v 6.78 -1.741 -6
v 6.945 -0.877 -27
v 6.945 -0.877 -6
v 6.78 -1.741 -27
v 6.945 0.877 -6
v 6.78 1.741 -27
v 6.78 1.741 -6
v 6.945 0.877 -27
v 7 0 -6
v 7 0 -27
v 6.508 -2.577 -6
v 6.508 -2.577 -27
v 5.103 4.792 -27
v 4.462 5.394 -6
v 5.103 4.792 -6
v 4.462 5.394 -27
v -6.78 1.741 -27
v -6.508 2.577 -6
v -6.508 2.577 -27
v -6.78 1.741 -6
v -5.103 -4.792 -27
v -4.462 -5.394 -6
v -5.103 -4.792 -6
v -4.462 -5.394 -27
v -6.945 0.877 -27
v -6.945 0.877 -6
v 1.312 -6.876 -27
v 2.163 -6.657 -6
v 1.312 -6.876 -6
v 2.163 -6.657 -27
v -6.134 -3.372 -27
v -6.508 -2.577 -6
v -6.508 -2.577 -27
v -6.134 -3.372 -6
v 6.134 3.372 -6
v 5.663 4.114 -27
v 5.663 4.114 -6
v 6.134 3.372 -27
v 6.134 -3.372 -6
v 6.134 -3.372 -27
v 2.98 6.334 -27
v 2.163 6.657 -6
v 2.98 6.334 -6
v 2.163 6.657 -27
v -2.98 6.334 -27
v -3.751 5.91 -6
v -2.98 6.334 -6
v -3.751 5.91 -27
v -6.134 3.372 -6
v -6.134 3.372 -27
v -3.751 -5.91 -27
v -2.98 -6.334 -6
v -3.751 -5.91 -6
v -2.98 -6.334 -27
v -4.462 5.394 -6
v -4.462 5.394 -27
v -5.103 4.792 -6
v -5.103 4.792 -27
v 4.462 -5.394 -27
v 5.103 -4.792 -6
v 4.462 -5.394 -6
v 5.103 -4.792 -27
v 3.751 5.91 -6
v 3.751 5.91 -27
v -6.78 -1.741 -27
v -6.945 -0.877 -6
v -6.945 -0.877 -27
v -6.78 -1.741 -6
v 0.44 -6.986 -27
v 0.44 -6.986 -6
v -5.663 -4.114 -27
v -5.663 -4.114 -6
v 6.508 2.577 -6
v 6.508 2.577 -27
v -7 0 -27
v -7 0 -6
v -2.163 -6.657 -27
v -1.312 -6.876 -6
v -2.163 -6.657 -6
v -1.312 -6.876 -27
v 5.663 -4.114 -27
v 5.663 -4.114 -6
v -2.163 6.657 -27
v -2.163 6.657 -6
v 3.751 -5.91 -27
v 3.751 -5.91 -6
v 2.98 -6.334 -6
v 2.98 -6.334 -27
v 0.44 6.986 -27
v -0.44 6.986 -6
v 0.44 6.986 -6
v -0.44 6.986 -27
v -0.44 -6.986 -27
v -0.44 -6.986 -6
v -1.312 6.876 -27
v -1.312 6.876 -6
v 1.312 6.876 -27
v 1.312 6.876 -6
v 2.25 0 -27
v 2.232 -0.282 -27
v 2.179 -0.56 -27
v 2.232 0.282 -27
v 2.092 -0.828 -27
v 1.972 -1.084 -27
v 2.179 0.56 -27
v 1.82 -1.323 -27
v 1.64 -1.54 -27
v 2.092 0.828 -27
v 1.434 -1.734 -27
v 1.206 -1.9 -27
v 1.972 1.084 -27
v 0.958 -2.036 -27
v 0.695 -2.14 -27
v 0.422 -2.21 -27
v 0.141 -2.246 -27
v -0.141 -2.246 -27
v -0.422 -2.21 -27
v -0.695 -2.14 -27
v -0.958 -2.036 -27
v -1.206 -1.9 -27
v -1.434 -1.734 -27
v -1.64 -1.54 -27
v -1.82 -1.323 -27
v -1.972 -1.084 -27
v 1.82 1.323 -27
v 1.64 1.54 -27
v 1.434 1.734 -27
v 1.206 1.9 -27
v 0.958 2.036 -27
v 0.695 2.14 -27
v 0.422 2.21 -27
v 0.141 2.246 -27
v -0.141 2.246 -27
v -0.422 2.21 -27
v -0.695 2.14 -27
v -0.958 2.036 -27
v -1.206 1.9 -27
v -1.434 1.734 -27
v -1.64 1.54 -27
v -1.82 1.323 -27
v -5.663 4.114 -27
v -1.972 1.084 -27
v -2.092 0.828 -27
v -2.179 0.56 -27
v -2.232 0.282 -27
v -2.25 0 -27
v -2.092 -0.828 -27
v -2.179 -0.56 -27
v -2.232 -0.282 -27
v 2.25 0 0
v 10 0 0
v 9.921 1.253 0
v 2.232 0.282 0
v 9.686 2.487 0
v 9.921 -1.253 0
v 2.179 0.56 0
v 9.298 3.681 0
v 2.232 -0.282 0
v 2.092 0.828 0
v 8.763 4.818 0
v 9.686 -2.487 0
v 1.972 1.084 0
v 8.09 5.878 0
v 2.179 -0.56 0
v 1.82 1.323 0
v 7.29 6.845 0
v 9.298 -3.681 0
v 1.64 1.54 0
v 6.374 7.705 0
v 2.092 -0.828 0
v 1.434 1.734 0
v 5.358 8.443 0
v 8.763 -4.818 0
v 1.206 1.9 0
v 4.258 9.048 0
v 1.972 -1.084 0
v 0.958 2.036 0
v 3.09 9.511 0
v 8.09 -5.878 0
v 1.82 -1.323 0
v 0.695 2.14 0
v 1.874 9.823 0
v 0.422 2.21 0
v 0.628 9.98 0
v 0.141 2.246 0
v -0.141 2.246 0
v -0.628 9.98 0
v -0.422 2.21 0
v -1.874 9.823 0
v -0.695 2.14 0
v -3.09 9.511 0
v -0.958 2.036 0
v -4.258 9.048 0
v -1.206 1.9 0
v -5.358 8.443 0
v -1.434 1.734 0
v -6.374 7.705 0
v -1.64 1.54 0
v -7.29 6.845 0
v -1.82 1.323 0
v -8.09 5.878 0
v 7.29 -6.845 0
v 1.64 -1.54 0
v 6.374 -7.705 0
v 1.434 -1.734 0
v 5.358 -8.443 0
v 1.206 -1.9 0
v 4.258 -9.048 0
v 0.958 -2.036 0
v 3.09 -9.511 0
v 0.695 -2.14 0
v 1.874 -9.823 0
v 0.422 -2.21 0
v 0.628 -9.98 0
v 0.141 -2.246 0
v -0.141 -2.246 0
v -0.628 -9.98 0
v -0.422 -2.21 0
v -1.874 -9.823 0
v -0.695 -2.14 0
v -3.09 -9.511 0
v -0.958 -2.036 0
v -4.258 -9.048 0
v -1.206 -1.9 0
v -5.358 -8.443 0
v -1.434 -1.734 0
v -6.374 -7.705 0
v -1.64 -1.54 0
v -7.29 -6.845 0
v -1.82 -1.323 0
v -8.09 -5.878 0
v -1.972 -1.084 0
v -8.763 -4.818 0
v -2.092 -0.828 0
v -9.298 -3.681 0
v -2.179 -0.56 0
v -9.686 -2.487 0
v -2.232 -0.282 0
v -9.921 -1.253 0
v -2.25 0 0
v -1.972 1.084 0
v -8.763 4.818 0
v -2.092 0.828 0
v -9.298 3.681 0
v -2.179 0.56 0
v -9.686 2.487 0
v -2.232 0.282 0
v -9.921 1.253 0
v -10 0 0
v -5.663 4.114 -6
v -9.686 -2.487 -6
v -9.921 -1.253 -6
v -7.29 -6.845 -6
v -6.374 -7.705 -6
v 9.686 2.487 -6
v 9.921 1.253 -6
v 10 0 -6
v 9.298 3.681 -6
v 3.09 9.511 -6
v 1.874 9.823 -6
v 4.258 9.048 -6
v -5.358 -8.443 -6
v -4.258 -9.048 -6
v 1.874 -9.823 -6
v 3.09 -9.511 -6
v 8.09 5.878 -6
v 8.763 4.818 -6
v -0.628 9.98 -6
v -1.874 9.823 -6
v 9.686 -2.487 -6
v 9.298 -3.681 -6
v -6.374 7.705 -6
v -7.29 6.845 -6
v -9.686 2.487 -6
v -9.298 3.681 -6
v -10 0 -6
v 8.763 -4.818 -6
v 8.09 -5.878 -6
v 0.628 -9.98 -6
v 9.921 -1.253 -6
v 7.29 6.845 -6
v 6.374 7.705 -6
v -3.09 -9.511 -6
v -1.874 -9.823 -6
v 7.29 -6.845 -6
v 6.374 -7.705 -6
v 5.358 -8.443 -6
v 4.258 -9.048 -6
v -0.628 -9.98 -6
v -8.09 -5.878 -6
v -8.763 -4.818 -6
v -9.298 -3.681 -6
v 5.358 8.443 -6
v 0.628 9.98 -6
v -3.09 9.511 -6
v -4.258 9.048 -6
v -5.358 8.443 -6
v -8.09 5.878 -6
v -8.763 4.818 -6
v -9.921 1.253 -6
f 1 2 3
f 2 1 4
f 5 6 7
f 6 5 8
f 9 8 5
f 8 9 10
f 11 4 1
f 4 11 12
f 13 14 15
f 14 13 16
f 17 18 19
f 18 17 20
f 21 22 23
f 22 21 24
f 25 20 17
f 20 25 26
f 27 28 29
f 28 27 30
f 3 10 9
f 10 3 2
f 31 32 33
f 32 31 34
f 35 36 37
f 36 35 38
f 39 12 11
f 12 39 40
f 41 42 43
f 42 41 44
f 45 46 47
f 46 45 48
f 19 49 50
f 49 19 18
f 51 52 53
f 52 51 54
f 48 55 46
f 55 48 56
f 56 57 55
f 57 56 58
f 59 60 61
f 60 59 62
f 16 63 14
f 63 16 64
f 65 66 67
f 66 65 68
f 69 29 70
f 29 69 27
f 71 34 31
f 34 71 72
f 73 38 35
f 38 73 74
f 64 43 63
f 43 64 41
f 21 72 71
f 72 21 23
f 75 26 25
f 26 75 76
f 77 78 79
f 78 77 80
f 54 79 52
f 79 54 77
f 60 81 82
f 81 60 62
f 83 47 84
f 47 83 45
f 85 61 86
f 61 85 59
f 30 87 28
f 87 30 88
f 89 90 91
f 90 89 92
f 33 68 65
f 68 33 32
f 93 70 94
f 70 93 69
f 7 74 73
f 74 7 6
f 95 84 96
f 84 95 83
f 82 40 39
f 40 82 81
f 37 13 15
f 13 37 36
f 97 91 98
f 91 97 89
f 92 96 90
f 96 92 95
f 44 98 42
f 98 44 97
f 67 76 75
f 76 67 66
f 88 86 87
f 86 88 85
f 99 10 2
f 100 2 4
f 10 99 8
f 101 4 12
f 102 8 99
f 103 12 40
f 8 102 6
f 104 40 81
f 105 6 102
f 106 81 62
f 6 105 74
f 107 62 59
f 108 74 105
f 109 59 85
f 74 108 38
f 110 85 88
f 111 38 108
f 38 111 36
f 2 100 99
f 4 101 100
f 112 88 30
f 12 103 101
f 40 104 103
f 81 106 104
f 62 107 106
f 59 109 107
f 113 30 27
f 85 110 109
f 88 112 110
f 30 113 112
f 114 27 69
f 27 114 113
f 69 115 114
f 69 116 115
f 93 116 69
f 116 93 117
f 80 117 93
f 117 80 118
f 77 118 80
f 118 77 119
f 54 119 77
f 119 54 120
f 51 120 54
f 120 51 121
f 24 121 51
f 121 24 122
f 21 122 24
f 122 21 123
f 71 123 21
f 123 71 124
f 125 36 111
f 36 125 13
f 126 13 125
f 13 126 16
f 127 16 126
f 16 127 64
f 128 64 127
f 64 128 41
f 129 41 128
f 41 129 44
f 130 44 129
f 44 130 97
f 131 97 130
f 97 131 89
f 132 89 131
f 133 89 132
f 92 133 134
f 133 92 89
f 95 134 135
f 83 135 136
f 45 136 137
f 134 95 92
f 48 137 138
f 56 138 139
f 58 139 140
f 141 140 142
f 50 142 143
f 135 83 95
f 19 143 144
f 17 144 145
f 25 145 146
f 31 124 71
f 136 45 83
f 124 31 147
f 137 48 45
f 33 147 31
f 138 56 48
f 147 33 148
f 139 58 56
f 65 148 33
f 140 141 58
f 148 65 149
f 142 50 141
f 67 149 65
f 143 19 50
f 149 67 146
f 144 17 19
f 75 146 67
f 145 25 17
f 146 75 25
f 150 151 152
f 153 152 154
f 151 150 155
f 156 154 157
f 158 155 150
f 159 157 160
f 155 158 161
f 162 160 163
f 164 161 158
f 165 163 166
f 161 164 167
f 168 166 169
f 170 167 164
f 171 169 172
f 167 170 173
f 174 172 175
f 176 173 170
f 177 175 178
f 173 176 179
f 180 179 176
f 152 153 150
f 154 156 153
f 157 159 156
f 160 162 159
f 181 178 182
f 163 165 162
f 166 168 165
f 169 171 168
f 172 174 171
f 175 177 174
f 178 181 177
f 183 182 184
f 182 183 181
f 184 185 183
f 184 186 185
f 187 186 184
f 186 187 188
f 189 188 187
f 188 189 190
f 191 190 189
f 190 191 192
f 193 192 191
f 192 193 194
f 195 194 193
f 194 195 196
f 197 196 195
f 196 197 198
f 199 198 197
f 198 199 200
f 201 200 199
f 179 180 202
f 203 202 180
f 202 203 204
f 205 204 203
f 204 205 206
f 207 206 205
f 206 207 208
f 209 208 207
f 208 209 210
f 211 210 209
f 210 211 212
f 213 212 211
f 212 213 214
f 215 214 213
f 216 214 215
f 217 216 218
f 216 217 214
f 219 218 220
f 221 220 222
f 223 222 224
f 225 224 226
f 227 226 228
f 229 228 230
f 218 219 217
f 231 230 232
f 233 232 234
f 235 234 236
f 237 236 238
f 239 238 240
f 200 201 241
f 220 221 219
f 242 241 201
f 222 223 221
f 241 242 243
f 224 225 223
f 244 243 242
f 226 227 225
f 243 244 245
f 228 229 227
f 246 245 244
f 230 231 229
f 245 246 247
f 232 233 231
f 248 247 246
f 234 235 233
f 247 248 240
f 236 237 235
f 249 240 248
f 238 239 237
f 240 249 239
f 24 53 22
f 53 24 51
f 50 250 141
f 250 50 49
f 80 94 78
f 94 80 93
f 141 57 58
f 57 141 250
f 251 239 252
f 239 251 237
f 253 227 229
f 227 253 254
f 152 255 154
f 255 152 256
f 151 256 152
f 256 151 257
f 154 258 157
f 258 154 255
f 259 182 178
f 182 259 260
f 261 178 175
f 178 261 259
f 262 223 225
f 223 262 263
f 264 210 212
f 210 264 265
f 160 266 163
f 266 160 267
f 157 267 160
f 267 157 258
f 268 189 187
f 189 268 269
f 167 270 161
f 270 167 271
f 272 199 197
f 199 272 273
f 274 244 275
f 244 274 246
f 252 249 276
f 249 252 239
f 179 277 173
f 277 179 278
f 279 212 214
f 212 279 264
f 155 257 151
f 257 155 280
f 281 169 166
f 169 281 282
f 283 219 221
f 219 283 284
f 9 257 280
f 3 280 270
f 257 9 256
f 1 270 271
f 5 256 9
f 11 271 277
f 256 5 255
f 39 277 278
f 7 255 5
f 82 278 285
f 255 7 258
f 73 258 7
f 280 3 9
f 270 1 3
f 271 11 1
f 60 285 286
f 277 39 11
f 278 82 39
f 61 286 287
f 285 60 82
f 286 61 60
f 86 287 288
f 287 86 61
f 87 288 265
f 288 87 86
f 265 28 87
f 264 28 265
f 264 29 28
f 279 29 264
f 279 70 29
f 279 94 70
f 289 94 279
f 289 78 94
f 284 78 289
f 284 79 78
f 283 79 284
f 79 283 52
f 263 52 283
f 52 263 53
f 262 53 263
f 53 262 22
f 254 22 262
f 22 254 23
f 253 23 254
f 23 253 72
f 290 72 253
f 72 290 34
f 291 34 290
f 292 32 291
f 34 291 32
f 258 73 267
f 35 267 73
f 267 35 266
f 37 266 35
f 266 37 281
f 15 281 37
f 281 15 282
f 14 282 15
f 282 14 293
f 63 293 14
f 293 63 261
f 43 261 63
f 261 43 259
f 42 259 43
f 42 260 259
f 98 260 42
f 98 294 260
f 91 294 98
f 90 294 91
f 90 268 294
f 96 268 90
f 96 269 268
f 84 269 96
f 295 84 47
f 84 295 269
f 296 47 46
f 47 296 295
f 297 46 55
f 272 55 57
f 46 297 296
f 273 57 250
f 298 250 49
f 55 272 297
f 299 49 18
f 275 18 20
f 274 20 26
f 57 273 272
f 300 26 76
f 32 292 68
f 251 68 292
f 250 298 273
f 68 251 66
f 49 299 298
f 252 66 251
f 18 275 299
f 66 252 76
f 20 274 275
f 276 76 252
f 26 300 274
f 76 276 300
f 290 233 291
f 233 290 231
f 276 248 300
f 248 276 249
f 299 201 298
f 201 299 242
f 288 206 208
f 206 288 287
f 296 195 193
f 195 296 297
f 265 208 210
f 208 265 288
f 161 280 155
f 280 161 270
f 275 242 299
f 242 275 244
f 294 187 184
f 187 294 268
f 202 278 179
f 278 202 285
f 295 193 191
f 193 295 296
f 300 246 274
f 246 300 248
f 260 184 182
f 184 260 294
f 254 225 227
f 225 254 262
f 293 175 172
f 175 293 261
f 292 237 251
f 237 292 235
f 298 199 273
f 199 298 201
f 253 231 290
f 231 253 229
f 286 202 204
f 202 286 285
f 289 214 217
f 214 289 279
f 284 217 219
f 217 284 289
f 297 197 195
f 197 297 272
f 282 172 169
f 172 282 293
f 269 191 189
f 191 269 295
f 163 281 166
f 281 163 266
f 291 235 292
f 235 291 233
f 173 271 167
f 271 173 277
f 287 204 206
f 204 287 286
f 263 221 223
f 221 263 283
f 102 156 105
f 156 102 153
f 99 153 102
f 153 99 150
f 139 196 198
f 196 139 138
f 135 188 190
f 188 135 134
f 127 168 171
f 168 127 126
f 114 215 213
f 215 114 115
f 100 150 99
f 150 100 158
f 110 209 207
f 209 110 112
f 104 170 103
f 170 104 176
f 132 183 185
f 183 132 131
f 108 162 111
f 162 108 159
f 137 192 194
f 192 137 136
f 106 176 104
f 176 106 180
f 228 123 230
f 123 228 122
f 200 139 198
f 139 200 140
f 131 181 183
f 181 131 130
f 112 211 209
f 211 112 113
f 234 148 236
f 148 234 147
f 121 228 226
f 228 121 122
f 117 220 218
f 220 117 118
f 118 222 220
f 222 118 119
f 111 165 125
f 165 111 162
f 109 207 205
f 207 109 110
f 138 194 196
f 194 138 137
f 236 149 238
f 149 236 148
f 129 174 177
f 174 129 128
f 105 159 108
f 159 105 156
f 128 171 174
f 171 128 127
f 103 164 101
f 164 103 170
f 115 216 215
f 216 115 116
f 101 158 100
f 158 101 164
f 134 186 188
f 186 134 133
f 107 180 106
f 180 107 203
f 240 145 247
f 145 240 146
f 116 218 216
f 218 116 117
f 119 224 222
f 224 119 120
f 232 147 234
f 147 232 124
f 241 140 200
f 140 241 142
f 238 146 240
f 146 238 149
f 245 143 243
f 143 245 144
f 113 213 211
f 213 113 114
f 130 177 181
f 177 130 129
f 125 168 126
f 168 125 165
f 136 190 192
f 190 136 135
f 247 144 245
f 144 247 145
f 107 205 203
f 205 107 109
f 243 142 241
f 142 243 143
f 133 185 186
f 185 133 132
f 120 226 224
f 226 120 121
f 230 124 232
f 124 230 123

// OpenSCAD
$fn = 50;


difference() {
	union() {
		translate(v = [0, 0, -27.0000000000]) {
			cylinder(h = 27, r = 7.0000000000);
		}
		translate(v = [0, 0, -6.0000000000]) {
			cylinder(h = 6, r = 10.0000000000);
		}
	}
	union() {
		#translate(v = [0, 0, -27]) {
			cylinder(h = 27, r = 2.2500000000);
		}
	}
}
